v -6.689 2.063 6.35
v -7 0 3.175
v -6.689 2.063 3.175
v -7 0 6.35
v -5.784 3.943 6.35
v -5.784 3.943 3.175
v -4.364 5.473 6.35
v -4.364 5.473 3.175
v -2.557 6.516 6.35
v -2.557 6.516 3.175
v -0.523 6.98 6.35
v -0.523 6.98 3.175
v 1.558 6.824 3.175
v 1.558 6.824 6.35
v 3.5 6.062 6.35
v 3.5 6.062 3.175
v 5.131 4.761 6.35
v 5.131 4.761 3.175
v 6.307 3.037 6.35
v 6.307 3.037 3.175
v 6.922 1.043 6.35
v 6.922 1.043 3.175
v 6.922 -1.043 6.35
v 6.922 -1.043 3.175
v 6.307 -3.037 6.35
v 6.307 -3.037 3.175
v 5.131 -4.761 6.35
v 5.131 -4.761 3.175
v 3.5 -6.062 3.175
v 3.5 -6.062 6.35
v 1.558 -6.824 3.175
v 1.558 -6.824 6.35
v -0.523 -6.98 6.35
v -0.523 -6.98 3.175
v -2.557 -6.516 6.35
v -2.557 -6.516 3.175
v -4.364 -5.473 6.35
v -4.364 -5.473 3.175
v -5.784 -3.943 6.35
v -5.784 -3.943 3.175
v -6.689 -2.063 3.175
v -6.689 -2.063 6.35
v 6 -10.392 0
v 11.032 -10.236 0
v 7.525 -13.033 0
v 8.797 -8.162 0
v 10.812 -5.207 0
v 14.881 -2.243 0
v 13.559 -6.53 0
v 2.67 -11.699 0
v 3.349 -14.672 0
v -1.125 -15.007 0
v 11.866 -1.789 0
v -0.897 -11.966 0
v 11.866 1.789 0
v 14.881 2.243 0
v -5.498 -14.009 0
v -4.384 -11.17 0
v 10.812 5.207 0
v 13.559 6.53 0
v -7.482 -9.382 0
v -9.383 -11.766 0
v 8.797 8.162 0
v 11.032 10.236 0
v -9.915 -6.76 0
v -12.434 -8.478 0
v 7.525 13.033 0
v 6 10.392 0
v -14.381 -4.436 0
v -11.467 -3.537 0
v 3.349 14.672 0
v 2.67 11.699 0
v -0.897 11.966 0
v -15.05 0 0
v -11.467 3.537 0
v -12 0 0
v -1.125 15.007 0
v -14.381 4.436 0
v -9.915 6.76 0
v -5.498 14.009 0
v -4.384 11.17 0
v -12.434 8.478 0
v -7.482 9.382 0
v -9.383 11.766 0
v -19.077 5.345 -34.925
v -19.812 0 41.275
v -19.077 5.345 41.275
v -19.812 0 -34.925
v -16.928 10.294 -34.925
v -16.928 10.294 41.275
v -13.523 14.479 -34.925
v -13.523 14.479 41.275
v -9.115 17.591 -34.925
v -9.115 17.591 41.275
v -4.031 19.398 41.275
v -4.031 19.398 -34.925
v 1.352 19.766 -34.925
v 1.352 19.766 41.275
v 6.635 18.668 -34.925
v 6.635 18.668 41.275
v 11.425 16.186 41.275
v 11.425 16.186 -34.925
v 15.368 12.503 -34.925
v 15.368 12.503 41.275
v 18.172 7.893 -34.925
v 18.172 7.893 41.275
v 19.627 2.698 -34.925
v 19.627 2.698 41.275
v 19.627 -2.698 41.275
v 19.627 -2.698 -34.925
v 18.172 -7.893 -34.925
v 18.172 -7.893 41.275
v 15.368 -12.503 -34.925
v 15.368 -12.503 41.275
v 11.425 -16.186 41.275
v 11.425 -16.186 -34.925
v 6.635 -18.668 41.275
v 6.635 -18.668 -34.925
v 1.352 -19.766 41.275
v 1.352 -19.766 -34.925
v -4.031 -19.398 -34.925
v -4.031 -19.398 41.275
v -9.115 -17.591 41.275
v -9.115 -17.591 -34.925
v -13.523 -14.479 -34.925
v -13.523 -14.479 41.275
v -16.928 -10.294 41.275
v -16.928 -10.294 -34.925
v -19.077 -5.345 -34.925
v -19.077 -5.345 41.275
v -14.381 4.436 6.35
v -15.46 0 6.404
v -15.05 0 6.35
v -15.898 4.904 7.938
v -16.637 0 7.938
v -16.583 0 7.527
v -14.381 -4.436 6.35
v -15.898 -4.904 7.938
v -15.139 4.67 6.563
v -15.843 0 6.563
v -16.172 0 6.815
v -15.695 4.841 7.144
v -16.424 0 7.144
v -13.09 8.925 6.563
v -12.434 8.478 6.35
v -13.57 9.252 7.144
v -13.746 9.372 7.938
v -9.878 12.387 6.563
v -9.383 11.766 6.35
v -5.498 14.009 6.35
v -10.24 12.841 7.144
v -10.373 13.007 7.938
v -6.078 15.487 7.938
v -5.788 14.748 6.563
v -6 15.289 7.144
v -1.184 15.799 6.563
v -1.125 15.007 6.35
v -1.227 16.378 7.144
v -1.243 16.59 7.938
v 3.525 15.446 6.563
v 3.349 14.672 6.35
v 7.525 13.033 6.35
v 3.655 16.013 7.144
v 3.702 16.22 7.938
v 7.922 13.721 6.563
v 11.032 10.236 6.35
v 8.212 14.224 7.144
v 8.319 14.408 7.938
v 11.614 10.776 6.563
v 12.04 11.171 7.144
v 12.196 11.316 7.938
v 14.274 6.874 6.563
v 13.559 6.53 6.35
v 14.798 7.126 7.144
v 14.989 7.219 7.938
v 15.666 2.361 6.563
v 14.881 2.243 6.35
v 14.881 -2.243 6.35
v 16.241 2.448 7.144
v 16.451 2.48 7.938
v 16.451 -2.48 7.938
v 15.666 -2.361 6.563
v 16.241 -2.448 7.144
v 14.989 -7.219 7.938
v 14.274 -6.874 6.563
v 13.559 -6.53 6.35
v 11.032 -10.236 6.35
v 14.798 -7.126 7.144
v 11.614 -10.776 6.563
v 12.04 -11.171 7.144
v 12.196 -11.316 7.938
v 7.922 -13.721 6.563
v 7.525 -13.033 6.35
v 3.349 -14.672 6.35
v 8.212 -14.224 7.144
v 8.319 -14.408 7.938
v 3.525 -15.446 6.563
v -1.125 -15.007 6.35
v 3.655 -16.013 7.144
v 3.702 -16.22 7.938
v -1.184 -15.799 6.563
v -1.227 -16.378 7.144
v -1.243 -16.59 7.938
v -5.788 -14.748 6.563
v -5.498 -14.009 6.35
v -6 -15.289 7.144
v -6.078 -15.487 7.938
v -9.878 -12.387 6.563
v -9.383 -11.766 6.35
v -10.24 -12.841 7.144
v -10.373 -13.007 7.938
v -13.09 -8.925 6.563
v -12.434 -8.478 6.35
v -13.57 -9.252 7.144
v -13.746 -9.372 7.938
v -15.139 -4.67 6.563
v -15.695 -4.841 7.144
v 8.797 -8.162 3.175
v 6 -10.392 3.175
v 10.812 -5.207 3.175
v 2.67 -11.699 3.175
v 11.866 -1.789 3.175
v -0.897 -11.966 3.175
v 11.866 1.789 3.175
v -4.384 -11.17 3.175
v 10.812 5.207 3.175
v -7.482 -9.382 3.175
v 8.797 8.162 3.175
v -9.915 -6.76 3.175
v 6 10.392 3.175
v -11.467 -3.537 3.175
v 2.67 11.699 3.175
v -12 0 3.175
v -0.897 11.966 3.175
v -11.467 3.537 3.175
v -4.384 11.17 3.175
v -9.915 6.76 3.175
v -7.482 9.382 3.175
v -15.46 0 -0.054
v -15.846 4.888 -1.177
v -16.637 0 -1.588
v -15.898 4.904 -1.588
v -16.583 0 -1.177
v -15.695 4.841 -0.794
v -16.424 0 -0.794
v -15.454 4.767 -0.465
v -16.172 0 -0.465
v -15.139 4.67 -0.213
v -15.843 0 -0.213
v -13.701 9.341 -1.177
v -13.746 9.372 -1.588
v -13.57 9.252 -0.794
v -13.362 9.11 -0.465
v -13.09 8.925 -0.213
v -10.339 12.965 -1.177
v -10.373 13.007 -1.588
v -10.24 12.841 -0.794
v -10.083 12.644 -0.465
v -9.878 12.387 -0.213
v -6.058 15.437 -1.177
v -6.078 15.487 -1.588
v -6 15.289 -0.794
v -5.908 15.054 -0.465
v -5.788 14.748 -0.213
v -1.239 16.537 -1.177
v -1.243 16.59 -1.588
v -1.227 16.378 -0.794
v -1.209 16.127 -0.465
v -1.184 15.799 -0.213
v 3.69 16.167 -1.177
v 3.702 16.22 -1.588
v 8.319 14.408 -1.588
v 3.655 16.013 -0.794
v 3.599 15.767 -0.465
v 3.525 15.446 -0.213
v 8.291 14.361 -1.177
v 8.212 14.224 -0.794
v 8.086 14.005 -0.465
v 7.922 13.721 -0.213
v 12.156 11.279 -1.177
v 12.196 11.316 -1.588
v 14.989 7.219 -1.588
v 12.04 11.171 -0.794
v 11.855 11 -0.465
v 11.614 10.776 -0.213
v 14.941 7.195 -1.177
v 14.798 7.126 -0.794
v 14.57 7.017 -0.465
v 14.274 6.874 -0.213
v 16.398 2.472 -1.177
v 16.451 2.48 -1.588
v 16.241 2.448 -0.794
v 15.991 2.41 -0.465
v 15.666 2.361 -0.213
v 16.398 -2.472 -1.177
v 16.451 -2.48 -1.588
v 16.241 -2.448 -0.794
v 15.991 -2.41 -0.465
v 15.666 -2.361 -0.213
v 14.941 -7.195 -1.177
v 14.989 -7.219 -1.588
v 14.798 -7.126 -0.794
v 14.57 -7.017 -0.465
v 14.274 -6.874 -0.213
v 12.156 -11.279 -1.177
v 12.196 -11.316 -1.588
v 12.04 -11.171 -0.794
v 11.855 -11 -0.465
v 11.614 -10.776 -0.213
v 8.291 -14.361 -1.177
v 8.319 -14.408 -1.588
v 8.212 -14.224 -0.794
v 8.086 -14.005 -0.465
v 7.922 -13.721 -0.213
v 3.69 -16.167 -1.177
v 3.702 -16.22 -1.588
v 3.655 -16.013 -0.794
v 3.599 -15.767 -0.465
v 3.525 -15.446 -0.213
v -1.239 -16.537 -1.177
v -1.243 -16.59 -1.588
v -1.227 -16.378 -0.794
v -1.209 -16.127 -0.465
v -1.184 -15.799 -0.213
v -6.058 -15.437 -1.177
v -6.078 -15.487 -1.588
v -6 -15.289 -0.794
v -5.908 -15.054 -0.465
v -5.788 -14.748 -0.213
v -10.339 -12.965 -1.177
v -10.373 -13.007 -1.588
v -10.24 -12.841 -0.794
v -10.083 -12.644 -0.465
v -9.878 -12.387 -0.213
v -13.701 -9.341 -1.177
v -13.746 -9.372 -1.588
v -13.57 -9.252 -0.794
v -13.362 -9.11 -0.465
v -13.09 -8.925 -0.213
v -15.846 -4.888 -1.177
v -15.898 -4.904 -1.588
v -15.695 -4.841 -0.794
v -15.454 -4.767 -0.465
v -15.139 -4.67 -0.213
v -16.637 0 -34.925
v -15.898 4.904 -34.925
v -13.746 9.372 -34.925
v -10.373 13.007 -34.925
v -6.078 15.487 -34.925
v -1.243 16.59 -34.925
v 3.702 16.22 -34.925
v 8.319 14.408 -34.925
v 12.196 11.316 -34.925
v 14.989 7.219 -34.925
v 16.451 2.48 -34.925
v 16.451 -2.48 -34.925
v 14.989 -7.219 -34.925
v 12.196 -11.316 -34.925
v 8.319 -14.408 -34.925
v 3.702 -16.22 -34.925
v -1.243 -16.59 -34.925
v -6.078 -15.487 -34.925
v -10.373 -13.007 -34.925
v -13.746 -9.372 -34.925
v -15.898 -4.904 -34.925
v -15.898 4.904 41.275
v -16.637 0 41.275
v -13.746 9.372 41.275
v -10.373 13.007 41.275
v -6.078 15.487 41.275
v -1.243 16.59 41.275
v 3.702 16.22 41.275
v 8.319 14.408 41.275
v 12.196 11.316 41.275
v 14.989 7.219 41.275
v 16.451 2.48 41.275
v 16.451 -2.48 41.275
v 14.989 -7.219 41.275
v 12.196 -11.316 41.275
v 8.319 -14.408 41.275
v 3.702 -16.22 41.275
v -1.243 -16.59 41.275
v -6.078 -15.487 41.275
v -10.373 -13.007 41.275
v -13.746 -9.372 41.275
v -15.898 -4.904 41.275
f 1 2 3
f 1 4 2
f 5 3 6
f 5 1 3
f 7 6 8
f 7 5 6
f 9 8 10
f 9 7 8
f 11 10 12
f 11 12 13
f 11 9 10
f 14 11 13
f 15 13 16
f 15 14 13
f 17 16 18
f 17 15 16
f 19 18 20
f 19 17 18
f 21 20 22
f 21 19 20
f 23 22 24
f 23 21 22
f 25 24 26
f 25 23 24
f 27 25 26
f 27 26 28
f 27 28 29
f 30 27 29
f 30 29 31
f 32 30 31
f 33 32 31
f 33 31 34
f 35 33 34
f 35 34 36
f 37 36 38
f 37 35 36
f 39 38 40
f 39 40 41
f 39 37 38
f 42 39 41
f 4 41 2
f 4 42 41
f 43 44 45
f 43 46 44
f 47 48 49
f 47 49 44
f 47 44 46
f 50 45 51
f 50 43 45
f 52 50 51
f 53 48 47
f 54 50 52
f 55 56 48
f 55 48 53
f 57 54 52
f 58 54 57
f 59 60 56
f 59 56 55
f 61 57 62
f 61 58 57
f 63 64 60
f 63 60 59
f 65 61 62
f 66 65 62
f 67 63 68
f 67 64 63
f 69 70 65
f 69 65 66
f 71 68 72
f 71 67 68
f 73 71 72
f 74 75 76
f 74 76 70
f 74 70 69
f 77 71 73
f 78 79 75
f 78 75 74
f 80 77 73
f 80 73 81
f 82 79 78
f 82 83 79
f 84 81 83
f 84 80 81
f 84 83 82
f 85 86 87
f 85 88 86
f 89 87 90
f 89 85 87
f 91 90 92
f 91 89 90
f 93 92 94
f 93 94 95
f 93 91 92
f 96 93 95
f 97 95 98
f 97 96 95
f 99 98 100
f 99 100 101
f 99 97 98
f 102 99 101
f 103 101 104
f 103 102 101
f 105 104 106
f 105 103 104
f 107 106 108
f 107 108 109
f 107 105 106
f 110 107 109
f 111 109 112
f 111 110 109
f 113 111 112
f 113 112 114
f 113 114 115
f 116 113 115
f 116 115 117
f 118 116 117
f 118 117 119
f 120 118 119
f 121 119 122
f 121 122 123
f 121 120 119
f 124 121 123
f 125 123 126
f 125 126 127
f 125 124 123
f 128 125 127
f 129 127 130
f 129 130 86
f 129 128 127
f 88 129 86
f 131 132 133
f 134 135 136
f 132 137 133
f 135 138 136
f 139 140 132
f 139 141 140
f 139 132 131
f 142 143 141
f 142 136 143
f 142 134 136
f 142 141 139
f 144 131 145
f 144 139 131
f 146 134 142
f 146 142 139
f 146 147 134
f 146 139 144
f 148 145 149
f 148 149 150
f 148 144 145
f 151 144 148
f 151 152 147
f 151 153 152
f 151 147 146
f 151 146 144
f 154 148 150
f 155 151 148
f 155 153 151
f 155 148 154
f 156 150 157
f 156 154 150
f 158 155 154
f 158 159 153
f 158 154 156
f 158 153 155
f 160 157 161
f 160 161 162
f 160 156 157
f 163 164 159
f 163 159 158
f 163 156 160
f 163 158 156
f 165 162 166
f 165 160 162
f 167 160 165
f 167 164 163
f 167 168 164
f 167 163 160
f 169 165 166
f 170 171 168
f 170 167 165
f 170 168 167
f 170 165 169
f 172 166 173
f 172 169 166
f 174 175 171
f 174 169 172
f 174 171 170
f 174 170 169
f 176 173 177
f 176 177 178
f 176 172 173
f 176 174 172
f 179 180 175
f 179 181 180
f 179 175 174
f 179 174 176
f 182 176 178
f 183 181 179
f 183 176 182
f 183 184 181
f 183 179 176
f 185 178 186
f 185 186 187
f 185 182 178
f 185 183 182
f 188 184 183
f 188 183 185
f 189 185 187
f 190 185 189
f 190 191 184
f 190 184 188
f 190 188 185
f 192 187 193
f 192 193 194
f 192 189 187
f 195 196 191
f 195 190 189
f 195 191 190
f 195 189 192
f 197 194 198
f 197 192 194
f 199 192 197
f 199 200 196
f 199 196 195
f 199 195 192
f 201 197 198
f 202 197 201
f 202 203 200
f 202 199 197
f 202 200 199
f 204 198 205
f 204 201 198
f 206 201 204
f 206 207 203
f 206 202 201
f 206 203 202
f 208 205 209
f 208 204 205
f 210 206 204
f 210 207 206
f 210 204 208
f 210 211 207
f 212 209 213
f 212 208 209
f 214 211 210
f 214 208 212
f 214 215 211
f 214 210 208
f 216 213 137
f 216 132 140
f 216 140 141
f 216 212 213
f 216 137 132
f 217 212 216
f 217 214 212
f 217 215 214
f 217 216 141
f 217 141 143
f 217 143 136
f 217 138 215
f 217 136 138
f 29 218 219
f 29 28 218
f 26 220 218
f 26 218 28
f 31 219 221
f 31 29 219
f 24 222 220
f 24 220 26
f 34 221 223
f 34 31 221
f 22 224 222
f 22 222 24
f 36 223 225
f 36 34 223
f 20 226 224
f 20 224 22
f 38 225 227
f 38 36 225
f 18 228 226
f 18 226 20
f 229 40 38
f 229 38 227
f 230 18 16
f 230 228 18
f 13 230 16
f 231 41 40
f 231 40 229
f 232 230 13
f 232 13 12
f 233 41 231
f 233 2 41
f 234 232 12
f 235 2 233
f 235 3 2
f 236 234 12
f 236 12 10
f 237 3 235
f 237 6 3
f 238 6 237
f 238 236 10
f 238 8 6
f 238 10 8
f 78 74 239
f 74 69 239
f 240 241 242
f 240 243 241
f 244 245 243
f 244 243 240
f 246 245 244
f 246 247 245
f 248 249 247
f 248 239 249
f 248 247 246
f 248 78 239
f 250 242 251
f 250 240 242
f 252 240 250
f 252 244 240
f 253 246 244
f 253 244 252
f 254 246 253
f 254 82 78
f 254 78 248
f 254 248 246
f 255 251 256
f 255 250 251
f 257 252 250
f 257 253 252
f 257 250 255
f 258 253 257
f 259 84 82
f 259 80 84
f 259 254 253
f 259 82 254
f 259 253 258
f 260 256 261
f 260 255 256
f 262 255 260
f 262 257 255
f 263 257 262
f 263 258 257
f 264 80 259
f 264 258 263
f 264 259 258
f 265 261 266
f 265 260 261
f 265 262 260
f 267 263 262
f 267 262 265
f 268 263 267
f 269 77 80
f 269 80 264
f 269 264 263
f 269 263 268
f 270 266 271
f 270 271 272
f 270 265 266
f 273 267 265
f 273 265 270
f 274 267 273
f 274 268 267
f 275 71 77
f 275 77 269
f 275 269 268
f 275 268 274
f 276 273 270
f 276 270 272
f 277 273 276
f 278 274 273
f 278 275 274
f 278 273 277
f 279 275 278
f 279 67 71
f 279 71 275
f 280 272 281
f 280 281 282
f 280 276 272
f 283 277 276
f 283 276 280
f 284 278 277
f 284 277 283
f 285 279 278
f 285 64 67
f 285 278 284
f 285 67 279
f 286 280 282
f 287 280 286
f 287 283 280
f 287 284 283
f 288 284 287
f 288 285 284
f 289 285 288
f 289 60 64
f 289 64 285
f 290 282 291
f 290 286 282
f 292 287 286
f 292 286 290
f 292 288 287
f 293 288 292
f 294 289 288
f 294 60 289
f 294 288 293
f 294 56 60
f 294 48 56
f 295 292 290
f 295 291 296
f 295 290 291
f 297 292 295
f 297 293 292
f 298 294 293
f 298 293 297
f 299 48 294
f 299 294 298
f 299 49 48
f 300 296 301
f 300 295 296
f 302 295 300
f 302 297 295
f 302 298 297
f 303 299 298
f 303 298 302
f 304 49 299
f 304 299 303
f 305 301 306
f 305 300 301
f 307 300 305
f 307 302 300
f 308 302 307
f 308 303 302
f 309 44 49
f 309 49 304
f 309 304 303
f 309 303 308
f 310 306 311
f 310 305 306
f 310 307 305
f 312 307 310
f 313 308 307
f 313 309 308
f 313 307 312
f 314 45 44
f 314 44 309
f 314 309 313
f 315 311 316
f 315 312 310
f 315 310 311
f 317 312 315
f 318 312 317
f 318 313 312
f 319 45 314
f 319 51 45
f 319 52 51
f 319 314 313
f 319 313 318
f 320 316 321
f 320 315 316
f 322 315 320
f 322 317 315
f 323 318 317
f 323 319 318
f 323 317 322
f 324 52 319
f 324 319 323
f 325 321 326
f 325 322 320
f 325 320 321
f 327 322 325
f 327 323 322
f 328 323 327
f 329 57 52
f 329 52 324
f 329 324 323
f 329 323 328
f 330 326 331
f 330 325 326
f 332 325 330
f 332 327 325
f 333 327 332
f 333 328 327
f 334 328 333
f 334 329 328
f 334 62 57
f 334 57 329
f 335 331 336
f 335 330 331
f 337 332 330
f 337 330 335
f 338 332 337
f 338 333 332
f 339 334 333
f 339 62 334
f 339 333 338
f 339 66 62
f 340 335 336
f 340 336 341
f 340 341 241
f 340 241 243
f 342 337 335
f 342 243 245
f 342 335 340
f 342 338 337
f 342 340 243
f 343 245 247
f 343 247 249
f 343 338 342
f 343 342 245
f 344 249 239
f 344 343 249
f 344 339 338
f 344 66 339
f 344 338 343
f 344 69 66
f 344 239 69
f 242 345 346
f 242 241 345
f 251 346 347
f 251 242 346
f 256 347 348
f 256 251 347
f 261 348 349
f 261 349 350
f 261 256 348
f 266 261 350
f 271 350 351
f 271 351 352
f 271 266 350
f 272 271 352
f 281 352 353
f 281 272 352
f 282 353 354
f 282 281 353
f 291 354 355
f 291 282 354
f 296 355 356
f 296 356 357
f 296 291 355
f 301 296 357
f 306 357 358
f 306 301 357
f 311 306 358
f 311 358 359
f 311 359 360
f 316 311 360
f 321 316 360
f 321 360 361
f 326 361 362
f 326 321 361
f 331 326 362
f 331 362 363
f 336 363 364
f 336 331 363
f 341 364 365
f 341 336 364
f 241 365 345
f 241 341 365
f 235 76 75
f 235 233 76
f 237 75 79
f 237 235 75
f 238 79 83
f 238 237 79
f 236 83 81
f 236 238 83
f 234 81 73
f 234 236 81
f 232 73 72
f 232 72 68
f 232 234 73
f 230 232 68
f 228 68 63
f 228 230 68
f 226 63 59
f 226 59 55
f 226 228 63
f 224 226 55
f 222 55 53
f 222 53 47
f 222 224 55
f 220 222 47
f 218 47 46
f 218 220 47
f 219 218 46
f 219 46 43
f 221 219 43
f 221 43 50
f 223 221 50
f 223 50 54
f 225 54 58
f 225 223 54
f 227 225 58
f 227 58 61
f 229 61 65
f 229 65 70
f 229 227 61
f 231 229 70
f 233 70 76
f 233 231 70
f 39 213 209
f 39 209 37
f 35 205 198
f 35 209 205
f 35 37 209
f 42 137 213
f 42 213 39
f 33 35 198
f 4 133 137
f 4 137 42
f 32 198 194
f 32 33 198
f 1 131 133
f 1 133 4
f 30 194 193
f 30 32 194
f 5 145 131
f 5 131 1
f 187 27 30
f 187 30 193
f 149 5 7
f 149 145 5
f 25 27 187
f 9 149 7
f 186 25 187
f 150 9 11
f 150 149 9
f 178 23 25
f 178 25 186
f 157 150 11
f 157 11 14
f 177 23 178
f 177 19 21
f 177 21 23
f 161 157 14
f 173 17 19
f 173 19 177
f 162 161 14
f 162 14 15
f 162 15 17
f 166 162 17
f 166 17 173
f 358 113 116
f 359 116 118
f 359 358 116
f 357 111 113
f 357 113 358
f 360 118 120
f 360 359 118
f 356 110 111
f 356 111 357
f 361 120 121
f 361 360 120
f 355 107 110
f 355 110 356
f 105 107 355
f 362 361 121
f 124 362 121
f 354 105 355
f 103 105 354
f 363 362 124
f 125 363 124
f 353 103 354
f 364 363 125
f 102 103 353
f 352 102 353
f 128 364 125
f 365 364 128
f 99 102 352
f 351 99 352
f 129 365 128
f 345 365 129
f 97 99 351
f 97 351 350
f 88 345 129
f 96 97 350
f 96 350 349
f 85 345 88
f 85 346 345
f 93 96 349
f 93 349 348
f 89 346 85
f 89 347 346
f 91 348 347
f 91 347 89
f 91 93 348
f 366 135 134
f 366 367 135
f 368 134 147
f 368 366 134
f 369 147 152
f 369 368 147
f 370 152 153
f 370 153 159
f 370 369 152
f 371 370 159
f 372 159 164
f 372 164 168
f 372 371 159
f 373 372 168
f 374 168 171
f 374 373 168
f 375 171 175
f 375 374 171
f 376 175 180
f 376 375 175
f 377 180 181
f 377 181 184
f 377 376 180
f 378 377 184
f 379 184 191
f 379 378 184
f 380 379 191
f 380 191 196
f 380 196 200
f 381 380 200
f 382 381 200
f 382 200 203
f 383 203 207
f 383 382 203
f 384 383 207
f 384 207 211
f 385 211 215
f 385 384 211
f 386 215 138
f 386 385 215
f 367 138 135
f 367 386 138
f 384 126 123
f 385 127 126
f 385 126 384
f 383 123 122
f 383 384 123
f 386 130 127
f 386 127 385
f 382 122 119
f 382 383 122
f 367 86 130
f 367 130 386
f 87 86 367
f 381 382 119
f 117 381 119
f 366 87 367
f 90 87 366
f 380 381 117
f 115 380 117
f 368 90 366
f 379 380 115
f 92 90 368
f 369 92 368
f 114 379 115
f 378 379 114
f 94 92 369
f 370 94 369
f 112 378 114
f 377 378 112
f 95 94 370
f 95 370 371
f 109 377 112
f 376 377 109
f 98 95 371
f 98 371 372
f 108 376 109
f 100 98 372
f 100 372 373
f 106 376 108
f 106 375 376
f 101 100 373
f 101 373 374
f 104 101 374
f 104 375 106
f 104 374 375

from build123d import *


with BuildPart() as f1:
    # F0 (on Front) → F1 (revolve)
    with BuildSketch(Plane.XZ):
        with BuildLine():
            Line((-16.637, 41.275), (-19.812, 41.275))
            Line((-19.812, 41.275), (-19.812, -34.925))
            Line((-19.812, -34.925), (-16.637, -34.925))
            Line((-16.637, -34.925), (-16.637, -1.5875))
            ThreePointArc((-16.637, -1.5875), (-16.172032, -0.464968), (-15.0495, 0))
            Line((-15.0495, 0), (-12, 0))
            Line((-12, 0), (-12, 3.175))
            Line((-12, 3.175), (-7, 3.175))
            Line((-7, 3.175), (-7, 6.35))
            Line((-7, 6.35), (-15.0495, 6.35))
            ThreePointArc((-15.0495, 6.35), (-16.172032, 6.814968), (-16.637, 7.9375))
            Line((-16.637, 7.9375), (-16.637, 41.275))
        make_face()
    revolve(axis=Axis((0, 0, -3.752202), (0, 0, -1)))


solid = f1.part
